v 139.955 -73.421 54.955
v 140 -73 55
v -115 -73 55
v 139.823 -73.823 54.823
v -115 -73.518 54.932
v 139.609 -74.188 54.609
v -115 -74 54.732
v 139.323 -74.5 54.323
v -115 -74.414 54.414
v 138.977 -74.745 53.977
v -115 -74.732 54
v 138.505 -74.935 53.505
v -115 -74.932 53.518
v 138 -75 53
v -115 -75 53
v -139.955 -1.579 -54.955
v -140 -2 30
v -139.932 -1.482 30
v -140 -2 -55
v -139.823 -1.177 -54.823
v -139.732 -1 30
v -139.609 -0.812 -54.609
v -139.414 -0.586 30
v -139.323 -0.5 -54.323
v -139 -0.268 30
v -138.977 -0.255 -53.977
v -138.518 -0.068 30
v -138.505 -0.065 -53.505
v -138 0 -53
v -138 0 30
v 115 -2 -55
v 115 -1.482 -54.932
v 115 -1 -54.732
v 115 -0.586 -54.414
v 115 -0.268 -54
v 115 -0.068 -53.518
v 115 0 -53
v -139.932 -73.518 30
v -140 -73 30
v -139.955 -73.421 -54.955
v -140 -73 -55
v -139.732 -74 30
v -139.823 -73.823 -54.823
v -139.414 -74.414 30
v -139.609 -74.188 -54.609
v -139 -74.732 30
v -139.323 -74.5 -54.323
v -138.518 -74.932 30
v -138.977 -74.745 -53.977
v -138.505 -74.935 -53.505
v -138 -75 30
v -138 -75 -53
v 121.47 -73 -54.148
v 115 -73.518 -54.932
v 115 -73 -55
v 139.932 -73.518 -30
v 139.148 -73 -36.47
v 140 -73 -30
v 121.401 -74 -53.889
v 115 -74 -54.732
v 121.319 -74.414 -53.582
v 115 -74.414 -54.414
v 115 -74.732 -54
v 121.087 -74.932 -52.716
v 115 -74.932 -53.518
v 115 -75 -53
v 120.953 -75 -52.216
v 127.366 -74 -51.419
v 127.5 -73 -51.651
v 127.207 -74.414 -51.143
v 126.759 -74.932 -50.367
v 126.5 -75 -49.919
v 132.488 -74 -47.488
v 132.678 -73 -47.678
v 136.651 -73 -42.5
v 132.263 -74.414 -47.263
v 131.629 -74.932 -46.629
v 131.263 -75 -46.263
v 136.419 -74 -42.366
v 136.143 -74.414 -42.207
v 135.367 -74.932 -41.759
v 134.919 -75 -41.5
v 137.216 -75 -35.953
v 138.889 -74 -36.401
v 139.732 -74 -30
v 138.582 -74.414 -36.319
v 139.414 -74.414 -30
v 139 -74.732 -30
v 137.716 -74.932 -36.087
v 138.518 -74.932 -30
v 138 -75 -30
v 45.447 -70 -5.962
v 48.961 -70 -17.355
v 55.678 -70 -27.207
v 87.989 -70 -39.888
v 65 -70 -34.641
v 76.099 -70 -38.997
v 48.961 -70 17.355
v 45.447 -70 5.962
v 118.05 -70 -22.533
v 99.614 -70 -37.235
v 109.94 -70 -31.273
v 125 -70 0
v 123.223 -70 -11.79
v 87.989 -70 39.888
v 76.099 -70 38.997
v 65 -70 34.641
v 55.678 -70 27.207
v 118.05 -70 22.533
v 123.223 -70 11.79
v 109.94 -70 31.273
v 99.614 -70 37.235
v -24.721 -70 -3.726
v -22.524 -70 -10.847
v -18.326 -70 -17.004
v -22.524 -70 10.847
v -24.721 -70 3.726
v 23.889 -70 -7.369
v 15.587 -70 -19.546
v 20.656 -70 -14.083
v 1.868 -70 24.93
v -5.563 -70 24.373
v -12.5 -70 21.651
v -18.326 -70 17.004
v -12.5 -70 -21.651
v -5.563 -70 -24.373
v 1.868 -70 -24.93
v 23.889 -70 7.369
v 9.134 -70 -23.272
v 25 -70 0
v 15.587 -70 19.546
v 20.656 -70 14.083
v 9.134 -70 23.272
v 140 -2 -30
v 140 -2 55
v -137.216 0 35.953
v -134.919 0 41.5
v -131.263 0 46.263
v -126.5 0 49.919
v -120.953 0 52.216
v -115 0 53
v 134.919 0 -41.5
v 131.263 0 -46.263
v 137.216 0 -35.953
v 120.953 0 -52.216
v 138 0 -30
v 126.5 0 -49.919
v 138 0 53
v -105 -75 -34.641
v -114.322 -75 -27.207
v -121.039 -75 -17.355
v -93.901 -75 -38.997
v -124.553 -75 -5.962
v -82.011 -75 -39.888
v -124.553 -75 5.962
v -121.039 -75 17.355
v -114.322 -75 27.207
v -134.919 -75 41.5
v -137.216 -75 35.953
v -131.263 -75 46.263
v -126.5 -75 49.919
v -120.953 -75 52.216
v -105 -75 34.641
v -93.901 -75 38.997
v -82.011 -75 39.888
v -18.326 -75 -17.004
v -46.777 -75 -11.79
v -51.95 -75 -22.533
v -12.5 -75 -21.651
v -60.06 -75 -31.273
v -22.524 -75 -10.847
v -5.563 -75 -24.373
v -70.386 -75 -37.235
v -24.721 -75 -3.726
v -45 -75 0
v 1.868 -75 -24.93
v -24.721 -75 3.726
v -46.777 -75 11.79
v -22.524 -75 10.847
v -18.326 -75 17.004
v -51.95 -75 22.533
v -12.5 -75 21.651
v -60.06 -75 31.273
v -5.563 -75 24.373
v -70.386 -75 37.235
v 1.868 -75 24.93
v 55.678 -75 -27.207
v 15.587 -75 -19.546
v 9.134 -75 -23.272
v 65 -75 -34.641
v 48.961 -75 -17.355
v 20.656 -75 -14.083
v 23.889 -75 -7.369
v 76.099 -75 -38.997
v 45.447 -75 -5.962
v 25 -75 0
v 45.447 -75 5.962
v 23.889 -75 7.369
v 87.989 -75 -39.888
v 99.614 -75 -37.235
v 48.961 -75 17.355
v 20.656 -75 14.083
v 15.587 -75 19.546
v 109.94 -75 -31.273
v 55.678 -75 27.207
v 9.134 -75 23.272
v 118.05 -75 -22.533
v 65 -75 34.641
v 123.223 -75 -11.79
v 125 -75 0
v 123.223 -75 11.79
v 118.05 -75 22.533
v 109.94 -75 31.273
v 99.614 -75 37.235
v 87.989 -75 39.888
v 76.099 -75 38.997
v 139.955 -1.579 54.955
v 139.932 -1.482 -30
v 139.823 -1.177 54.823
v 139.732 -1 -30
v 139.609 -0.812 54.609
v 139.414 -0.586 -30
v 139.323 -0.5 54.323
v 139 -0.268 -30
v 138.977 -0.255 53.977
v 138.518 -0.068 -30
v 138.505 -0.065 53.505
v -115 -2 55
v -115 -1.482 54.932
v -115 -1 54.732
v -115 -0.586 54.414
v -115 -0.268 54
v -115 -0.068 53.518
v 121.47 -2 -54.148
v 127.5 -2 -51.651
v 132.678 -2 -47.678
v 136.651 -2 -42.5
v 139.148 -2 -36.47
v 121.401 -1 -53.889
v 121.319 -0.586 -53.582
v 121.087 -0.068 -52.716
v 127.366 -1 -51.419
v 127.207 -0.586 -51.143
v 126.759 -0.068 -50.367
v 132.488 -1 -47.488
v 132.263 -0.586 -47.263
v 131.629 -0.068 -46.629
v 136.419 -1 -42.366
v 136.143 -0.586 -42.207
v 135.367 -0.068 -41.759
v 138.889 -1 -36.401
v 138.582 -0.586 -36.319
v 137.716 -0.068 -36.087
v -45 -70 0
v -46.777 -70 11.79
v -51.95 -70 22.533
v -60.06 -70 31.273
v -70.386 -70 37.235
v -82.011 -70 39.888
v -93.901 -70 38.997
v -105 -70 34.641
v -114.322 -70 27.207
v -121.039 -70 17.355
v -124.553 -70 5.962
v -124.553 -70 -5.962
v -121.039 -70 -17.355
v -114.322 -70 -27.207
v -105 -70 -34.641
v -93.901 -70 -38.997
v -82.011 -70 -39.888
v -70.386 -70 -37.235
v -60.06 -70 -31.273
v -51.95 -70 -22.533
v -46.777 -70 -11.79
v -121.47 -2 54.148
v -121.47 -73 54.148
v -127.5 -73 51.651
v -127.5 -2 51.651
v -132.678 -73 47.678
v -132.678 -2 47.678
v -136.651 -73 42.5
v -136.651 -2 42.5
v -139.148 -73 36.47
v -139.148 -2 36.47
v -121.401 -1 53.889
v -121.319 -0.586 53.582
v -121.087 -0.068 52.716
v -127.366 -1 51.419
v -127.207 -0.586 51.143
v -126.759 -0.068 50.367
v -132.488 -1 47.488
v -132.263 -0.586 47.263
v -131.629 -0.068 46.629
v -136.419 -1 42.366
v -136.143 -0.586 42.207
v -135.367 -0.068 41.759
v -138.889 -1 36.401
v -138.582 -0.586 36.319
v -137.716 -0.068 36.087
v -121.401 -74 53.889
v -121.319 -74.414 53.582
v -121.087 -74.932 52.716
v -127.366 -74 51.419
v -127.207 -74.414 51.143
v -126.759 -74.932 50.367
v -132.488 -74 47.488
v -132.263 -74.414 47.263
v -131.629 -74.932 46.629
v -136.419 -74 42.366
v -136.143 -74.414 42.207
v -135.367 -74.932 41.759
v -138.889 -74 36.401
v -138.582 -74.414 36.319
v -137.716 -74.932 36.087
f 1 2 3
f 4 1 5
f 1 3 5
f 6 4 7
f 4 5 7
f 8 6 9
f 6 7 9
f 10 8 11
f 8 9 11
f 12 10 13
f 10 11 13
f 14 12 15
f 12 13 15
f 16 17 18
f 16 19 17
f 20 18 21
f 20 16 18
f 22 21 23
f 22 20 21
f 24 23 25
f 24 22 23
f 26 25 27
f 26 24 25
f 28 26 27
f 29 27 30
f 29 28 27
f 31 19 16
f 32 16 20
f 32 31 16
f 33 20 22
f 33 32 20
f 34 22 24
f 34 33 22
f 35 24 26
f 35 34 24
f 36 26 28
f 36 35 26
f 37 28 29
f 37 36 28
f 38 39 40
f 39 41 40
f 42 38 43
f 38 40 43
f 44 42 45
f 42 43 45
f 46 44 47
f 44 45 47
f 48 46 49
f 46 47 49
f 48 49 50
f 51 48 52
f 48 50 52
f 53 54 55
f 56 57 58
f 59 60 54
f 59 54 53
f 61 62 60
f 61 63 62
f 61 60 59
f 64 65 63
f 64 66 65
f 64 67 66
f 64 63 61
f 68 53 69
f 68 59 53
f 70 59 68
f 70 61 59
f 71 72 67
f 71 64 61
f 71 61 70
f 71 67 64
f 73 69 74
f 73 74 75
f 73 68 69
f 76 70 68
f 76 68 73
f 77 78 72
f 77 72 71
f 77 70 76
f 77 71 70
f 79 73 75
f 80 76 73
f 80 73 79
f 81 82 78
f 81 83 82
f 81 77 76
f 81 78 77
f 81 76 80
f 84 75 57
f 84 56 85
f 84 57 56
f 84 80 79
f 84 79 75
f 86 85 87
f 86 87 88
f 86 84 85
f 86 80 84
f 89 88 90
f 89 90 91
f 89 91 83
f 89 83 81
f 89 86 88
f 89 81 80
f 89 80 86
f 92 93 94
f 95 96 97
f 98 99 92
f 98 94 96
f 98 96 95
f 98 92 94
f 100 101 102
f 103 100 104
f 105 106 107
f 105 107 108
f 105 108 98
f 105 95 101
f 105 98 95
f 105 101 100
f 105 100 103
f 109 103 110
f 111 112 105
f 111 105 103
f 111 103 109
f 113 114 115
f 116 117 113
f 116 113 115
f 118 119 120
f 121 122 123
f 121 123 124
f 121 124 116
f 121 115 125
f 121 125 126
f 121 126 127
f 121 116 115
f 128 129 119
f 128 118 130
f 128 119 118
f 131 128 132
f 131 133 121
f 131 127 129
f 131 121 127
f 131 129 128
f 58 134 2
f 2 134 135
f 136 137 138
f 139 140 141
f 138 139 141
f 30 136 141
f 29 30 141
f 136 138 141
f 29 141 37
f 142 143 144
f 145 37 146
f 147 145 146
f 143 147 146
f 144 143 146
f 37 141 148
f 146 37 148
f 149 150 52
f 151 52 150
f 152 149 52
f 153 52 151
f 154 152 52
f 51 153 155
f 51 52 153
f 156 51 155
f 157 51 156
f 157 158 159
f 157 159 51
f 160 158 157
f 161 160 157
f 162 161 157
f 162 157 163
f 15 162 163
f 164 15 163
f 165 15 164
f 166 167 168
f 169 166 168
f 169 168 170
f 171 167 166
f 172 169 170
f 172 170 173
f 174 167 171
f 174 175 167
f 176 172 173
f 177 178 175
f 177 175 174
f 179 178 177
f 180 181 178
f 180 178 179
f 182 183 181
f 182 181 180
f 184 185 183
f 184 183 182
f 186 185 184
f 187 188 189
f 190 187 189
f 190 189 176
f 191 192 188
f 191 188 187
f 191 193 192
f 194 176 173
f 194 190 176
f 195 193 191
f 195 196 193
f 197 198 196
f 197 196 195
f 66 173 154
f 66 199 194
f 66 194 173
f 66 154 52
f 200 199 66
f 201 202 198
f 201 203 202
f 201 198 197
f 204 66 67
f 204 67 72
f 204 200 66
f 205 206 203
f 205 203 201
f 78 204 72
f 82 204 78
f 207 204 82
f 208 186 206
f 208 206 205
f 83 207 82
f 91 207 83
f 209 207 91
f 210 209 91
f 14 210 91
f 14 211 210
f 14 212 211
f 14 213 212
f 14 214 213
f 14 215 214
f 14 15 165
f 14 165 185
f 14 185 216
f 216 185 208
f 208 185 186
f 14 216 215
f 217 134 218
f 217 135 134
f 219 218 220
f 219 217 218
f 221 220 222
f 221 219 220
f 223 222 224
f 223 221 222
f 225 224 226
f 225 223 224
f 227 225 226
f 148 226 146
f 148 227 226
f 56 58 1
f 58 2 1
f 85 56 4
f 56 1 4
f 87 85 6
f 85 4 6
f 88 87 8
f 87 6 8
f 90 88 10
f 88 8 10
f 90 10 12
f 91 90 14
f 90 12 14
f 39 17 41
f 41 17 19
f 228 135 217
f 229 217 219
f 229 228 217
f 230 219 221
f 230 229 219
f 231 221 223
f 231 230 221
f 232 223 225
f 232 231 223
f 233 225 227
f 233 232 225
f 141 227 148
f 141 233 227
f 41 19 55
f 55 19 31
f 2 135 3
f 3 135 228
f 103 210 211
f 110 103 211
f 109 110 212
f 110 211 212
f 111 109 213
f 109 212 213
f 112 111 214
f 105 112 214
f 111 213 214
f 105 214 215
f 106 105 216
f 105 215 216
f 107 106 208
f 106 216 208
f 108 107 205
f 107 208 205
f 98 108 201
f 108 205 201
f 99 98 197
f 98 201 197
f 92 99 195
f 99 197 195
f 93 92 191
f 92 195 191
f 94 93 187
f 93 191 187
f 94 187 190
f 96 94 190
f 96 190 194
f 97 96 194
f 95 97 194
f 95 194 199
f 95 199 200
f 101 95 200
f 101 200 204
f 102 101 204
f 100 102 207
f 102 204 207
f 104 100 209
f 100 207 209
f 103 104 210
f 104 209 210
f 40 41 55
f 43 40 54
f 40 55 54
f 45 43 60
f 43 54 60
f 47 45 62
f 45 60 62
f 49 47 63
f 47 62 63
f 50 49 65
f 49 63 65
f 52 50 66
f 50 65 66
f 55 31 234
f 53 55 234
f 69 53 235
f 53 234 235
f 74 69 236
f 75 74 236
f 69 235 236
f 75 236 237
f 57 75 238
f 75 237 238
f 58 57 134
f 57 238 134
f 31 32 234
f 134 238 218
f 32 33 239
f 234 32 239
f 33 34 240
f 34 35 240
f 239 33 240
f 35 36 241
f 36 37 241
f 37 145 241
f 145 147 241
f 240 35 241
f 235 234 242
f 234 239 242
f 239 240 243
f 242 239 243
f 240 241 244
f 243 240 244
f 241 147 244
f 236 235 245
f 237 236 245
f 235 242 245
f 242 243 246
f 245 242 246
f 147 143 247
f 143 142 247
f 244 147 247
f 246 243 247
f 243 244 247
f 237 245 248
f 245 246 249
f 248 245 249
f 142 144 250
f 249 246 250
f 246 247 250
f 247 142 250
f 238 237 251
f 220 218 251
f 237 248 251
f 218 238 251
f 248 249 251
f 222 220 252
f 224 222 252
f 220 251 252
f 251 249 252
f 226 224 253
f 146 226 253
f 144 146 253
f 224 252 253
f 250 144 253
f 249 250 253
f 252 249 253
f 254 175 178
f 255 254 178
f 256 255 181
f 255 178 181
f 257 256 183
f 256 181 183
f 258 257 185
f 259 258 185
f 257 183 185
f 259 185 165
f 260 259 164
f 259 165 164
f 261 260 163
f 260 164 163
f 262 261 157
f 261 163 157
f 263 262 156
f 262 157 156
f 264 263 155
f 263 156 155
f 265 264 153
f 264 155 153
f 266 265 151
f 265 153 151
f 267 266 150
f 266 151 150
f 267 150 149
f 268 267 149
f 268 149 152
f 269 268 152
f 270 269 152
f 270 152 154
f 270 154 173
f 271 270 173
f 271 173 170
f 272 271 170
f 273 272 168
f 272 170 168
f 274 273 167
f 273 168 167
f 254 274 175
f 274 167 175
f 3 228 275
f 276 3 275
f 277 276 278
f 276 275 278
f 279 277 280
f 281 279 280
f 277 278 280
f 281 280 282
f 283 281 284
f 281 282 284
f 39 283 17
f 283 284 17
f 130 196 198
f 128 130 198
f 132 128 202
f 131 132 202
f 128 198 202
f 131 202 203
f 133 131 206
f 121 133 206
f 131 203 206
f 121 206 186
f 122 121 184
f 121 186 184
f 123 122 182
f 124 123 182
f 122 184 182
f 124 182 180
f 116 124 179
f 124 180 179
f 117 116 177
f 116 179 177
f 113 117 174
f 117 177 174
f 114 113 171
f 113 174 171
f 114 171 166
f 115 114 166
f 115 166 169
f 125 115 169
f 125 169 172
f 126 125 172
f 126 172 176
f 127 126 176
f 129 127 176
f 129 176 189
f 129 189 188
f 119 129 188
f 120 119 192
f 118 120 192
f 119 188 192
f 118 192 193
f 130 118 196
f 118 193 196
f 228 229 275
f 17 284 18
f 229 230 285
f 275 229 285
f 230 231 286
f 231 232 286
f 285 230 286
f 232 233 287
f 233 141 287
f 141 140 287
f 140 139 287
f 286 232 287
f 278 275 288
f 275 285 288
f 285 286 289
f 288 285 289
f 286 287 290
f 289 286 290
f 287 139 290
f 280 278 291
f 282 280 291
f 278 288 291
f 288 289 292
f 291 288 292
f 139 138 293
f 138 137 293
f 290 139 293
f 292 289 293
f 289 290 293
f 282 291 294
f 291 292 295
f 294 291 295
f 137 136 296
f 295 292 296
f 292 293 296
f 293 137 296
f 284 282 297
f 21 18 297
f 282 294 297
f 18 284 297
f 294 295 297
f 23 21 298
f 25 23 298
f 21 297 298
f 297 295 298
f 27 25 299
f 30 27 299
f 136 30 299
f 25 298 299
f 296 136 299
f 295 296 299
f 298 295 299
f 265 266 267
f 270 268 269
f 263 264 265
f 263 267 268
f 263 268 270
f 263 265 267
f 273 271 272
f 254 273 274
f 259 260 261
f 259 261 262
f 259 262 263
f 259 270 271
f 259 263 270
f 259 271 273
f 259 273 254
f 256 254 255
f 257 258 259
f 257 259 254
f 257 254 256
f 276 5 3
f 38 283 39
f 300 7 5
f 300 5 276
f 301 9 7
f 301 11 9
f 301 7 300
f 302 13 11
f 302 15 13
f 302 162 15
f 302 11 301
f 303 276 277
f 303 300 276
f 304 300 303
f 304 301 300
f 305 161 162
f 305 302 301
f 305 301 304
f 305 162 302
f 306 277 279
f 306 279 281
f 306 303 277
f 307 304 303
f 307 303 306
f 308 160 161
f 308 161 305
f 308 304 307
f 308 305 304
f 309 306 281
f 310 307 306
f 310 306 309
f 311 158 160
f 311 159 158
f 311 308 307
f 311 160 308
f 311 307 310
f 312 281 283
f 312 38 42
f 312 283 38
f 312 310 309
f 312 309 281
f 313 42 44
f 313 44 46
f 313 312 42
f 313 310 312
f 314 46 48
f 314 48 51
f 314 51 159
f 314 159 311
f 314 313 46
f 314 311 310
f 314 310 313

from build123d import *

# Parameters (mm, degrees)
F1_DEPTH = 75
F2_R     = 2
F3_R     = 25
F3_R_2   = 40
F4_DEPTH = 5


with BuildPart() as f1:
    # F0 (on Front) → F1 (new body)
    with BuildSketch(Plane.XZ):
        with BuildLine():
            Line((-140, 30), (-140, -55))
            Line((-140, -55), (115, -55))
            ThreePointArc((115, -55), (132.6776695297, -47.6776695297), (140, -30))
            Line((140, -30), (140, 55))
            Line((140, 55), (-115, 55))
            ThreePointArc((-115, 55), (-132.6776695297, 47.6776695297), (-140, 30))
        make_face()
    extrude(amount=F1_DEPTH)

    # F2
    f2_edges = [f1.edges().sort_by_distance(p)[0] for p in [
        (-132.67767, -75, 47.67767),
        (-140, -75, -12.5),
        (-12.5, -75, -55),
        (132.67767, -75, -47.67767),
        (140, -75, 12.5),
        (12.5, -75, 55),
        (-132.67767, 0, 47.67767),
        (-140, 0, -12.5),
        (-12.5, 0, -55),
        (132.67767, 0, -47.67767),
        (140, 0, 12.5),
        (12.5, 0, 55),
    ]]
    fillet(f2_edges, radius=F2_R)

    # F3 (on face) → F4 (cut)
    with BuildSketch(Plane.XZ.offset(75)):
        Circle(F3_R)
        with Locations((-85, 0)):
            Circle(F3_R_2)
        with Locations((85, 0)):
            Circle(F3_R_2)
    extrude(amount=-F4_DEPTH, mode=Mode.SUBTRACT)


solid = f1.part
